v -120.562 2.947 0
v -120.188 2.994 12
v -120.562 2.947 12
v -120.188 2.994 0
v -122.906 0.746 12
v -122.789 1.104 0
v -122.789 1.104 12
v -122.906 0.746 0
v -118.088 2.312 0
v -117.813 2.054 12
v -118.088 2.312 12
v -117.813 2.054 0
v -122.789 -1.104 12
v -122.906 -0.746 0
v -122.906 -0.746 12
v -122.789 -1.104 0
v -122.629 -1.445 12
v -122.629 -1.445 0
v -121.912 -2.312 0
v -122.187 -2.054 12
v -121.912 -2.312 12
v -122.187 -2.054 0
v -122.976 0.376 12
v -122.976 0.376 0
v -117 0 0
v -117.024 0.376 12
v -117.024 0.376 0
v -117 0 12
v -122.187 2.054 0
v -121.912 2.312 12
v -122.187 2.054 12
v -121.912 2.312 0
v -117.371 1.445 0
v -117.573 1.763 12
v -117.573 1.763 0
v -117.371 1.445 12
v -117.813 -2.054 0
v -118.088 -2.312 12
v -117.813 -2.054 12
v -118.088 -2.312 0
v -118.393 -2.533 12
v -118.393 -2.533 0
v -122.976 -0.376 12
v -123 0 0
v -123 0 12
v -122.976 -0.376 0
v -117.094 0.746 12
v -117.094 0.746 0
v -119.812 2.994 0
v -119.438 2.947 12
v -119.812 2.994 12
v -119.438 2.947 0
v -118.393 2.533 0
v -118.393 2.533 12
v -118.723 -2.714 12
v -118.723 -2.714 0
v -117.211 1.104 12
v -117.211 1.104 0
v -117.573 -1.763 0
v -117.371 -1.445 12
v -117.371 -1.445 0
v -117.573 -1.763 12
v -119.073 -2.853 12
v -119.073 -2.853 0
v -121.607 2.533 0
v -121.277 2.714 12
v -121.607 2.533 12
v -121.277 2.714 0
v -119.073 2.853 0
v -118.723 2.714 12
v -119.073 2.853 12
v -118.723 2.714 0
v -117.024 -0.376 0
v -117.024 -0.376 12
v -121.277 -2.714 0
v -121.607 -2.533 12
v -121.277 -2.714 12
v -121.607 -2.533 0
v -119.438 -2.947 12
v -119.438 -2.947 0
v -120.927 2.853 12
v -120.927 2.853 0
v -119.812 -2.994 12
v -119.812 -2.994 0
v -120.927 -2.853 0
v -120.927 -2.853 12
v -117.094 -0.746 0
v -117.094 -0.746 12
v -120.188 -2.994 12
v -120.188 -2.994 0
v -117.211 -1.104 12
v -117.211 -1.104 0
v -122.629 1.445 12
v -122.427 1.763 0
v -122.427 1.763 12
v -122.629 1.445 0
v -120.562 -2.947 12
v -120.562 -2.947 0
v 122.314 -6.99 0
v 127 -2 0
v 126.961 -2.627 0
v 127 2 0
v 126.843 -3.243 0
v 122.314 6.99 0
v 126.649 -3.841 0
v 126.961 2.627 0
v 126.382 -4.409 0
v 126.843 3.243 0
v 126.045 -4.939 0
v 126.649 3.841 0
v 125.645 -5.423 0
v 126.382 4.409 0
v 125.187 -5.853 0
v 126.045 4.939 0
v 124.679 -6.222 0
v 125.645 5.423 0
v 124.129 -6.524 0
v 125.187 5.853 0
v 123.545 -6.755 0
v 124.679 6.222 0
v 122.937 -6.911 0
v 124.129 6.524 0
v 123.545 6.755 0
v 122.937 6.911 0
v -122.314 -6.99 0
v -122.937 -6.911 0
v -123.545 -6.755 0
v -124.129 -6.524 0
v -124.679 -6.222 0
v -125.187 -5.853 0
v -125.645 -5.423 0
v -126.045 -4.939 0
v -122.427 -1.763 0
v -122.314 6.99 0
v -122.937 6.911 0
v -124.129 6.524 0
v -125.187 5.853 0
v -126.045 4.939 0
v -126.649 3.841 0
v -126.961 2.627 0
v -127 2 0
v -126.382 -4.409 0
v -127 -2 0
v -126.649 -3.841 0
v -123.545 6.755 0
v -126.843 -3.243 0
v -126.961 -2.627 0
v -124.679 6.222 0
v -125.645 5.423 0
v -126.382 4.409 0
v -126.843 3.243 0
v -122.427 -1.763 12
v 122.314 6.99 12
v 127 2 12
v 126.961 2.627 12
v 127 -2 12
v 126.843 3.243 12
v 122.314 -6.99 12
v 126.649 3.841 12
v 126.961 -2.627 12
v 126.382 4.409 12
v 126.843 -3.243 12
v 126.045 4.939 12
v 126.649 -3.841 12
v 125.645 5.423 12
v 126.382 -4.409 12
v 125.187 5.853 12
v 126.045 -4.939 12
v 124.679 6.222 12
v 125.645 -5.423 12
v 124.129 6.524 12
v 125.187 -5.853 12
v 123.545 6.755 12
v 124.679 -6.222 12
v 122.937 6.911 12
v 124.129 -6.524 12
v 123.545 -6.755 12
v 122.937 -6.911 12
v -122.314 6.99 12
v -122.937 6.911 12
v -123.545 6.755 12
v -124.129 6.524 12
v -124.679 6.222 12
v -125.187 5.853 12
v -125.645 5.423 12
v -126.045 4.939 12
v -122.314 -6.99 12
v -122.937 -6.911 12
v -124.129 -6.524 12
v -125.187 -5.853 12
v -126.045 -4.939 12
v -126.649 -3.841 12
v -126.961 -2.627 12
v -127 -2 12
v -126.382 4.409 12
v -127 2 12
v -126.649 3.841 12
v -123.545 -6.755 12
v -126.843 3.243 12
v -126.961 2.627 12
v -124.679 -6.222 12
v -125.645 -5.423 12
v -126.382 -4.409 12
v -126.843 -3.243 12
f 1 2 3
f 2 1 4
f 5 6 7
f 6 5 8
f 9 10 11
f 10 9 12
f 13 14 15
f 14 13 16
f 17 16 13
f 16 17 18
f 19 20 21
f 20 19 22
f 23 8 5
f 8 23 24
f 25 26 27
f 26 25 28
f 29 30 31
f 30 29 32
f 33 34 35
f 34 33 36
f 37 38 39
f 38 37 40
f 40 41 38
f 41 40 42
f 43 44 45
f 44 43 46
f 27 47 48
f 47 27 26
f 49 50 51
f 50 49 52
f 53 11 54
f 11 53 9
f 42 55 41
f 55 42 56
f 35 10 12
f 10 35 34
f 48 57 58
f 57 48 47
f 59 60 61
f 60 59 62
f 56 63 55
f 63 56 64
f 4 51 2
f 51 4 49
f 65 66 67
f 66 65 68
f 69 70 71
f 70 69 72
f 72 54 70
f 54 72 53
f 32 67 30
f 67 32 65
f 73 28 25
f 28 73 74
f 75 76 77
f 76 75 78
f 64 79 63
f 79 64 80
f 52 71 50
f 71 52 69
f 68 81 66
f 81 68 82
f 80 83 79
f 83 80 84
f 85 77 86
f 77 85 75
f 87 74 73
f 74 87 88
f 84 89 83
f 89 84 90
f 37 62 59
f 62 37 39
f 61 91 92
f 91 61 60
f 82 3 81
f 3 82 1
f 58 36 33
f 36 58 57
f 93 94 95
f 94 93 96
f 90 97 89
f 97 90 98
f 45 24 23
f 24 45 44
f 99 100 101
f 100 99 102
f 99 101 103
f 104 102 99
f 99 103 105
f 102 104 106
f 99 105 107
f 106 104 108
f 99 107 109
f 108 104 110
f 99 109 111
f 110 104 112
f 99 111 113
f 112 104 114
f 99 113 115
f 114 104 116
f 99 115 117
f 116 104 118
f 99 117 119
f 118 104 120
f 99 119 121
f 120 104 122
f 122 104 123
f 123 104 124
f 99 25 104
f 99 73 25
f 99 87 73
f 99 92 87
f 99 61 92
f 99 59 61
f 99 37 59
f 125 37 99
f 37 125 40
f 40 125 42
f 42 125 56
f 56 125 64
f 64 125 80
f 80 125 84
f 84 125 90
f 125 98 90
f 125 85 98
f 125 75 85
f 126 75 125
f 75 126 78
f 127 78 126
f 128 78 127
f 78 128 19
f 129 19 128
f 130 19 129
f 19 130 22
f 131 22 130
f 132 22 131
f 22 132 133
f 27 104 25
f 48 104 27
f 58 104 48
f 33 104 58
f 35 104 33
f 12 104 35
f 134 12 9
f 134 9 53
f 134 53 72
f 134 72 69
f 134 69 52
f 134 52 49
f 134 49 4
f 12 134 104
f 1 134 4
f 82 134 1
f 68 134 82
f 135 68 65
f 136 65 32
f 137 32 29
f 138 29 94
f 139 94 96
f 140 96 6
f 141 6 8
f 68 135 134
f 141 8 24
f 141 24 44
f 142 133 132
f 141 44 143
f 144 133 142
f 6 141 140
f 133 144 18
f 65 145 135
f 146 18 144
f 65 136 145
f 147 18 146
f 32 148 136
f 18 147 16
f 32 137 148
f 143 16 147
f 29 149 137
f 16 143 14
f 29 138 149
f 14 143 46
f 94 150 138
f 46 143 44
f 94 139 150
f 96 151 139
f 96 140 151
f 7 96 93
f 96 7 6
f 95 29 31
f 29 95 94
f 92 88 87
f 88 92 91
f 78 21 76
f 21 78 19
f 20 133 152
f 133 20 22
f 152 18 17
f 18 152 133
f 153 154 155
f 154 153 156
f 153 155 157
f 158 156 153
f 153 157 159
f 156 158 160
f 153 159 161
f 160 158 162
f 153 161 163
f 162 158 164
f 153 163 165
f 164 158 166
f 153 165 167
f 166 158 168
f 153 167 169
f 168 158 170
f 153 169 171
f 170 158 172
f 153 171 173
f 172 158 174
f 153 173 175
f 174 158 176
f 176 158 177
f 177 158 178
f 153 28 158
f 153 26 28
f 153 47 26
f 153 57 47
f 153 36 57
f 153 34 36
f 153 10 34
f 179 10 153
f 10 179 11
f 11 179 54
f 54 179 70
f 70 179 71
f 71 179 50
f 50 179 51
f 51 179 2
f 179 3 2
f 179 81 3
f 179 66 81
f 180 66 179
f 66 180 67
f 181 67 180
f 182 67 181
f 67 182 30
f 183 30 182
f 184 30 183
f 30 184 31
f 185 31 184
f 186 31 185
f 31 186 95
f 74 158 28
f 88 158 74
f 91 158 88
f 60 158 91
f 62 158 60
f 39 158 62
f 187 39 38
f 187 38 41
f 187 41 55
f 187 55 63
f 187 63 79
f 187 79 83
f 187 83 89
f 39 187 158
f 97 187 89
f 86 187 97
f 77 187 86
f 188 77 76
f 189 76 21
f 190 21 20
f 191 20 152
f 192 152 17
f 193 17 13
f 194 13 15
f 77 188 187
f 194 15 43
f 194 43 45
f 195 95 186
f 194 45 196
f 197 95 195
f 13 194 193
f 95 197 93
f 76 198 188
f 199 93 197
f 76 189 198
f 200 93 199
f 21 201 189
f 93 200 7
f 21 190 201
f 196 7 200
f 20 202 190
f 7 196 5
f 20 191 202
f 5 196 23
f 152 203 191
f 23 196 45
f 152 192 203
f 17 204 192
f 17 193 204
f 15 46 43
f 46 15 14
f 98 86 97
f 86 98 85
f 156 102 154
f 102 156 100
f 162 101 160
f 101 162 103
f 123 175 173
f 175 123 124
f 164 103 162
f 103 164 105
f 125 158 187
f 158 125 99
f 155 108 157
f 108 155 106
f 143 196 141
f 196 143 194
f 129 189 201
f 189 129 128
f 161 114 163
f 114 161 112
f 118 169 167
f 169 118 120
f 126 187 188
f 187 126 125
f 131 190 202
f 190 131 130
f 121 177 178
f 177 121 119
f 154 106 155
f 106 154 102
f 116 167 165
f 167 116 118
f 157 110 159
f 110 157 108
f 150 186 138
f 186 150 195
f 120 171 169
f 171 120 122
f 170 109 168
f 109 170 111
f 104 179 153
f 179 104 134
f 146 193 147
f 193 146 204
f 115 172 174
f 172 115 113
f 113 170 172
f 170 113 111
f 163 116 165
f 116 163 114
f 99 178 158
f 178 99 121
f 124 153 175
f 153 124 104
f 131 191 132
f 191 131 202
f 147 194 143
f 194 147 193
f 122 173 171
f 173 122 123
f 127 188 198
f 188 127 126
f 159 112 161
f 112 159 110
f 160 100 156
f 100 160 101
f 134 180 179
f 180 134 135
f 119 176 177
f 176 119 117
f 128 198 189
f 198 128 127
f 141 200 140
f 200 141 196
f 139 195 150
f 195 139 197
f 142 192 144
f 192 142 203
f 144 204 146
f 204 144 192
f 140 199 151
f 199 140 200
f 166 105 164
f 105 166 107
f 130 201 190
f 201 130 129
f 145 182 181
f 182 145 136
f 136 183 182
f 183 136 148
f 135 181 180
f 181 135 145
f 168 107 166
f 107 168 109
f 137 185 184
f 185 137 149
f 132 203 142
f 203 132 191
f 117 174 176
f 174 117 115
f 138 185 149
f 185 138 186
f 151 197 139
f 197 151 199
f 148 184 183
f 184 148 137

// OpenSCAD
$fn = 50;


difference() {
	union() {
		hull() {
			translate(v = [-122.0000000000, 2.0000000000, 0]) {
				cylinder(h = 12, r = 5);
			}
			translate(v = [122.0000000000, 2.0000000000, 0]) {
				cylinder(h = 12, r = 5);
			}
			translate(v = [-122.0000000000, -2.0000000000, 0]) {
				cylinder(h = 12, r = 5);
			}
			translate(v = [122.0000000000, -2.0000000000, 0]) {
				cylinder(h = 12, r = 5);
			}
		}
	}
	union() {
		translate(v = [-120.0000000000, 0.0000000000, 0]) {
			cylinder(h = 12, r = 3.0000000000);
		}
		translate(v = [-120.0000000000, 0.0000000000, 0]) {
			cylinder(h = 12, r = 1.5000000000);
		}
		translate(v = [-120.0000000000, 0.0000000000, 0]) {
			cylinder(h = 12, r = 1.5000000000);
		}
		translate(v = [-120.0000000000, 0.0000000000, 0]) {
			cylinder(h = 12, r = 1.5000000000);
		}
	}
}
